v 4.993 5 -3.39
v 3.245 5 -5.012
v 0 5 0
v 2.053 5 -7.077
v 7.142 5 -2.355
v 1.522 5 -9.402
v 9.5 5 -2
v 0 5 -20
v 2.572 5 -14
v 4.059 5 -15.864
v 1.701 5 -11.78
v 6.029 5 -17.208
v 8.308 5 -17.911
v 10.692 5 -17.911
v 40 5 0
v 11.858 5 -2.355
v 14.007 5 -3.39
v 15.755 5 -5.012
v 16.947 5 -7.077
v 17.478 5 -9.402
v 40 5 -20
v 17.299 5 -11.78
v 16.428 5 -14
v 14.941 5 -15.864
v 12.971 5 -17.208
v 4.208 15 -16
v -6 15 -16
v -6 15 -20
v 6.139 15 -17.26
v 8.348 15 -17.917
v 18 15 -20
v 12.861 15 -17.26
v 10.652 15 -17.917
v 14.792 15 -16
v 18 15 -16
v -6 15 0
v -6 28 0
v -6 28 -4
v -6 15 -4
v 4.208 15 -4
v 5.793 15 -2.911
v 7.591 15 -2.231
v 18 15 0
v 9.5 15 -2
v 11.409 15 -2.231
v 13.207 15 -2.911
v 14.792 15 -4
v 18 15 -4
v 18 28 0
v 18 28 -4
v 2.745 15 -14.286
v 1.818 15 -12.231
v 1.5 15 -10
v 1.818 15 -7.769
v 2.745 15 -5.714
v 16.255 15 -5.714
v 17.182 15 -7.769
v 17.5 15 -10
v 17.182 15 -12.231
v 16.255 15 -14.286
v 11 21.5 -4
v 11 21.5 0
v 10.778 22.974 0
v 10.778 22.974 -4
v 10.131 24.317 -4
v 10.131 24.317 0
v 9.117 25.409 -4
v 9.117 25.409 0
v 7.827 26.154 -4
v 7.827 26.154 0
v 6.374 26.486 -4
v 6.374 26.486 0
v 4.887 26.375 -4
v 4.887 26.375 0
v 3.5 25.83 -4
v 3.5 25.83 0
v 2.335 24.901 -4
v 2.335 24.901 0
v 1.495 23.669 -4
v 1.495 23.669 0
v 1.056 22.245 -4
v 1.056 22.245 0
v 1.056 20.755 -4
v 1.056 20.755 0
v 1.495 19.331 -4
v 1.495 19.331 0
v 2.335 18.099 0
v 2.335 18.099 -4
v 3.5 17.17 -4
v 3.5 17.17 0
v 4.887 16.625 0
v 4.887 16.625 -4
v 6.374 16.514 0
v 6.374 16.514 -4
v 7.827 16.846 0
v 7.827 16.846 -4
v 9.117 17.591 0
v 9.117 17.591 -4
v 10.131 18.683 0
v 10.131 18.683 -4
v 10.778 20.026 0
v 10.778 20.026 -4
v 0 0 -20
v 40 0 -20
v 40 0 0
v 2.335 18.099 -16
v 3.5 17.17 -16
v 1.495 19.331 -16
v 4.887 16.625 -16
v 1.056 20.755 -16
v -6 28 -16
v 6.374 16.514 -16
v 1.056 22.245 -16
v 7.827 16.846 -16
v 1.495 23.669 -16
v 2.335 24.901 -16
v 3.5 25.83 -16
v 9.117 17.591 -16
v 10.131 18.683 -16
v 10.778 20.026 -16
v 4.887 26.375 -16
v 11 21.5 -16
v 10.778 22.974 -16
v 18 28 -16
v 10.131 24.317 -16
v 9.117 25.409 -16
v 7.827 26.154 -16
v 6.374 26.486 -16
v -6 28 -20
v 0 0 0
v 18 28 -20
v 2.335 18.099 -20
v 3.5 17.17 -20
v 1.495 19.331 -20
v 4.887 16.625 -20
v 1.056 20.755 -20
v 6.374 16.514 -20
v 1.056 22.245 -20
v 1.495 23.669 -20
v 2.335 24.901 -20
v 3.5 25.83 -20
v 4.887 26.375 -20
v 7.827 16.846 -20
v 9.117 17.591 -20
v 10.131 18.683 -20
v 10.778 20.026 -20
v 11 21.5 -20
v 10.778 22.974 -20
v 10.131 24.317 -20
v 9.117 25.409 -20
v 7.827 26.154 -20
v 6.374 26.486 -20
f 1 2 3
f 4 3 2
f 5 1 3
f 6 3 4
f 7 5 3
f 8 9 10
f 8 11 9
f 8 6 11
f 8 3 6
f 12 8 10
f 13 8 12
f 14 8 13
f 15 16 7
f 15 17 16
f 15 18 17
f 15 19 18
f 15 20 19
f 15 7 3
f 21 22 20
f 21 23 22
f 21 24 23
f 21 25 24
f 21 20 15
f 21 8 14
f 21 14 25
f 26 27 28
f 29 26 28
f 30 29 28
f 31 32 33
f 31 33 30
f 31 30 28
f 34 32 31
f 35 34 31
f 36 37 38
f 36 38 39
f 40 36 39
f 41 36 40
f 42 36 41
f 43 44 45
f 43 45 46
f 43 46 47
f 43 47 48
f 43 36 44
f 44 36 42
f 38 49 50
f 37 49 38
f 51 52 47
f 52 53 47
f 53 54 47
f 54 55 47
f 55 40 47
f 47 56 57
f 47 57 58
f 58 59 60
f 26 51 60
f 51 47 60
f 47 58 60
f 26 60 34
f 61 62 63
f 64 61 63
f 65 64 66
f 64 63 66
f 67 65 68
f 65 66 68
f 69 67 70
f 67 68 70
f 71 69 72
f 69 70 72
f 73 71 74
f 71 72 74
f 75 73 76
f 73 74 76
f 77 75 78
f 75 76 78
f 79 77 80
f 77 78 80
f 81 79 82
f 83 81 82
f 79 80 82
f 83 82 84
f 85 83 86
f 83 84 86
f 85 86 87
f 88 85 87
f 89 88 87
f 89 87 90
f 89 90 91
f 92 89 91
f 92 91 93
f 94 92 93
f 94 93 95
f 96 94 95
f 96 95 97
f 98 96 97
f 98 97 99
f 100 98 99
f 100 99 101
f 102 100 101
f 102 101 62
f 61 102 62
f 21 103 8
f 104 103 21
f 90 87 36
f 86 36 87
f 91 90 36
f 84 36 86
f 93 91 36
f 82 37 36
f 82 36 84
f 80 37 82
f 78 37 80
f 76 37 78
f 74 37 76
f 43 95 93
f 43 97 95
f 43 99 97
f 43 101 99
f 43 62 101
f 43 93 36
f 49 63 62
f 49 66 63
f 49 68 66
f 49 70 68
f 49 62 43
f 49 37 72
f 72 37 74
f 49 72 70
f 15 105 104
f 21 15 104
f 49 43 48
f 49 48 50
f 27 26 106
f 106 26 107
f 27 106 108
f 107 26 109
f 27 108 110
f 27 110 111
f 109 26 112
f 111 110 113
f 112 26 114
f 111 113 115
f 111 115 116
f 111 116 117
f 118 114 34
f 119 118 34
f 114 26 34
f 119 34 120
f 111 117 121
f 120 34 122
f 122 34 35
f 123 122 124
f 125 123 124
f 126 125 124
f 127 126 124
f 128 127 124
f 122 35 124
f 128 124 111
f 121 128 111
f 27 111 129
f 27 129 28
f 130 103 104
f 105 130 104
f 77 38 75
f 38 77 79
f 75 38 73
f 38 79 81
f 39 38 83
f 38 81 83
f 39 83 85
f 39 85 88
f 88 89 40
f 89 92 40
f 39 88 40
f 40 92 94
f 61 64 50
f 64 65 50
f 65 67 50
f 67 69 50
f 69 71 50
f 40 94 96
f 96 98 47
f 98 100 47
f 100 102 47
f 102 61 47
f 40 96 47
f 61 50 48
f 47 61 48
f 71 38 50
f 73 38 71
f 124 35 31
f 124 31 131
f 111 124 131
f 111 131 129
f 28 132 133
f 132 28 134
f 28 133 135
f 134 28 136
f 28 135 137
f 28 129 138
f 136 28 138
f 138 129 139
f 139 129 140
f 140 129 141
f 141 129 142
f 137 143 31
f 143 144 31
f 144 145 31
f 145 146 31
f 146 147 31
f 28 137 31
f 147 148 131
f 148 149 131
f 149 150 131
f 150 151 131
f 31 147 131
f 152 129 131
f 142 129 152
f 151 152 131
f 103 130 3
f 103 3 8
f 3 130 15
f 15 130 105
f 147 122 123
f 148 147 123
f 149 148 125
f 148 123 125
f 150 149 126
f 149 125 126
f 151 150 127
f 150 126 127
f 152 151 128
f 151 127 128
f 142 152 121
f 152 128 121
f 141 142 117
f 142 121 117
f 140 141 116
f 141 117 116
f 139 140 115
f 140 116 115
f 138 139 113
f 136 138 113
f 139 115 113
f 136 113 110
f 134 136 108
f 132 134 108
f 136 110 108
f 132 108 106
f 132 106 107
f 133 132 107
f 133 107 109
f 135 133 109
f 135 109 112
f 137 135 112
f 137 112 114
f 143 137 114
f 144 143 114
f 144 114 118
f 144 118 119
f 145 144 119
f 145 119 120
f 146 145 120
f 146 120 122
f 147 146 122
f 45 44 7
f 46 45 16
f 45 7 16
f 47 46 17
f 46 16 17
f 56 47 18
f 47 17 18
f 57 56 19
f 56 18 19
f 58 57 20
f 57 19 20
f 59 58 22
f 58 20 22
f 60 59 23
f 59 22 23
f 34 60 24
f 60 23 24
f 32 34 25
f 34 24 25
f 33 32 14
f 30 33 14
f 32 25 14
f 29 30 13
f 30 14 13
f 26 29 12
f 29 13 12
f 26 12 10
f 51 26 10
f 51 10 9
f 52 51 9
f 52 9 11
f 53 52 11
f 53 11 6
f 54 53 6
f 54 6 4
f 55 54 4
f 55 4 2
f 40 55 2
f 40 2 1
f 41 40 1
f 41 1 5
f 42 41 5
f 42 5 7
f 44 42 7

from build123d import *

# Parameters (mm, degrees)
SKETCH1_W           = 40
SKETCH1_H           = 20
BOSS_EXTRUDE1_DEPTH = 5
SKETCH2_R           = 8
BOSS_EXTRUDE2_DEPTH = 10
BOSS_EXTRUDE3_DEPTH = 20
CUT_EXTRUDE1_DEPTH  = 42.952353927
SKETCH6_R           = 5
CUT_EXTRUDE2_DEPTH  = 53.763623833


with BuildPart() as part:
    # Sketch1 → Boss-Extrude1 (new body)
    with BuildSketch(Plane(origin=(0, 0, 0), x_dir=(1, 0, 0), z_dir=(0, 1, 0))):
        with Locations((20, 10)):
            Rectangle(SKETCH1_W, SKETCH1_H)
    extrude(amount=BOSS_EXTRUDE1_DEPTH)

    # Sketch2 → Boss-Extrude2 (add)
    with BuildSketch(Plane(origin=(0, 5, 0), x_dir=(1, 0, 0), z_dir=(0, 1, 0))):
        with Locations(Location((9.5, 10, 0), (0, 0, 270))):
            Circle(SKETCH2_R)
    extrude(amount=BOSS_EXTRUDE2_DEPTH)

    # Sketch4 → Boss-Extrude3 (add, through all)
    with BuildSketch(Plane.XY):
        Polygon((-6, 15), (0, 15), (1.5, 15), (17.5, 15), (18, 15), (18, 28), (-6, 28), align=None)
    extrude(amount=-BOSS_EXTRUDE3_DEPTH)

    # Sketch5 → Cut-Extrude1 (cut, through all)
    with BuildSketch(Plane(origin=(18, 0, 0), x_dir=(0, 0, -1), z_dir=(1, 0, 0))):
        Polygon((10, 15), (16, 15), (16, 28), (4, 28), (4, 15), align=None)
    extrude(amount=-CUT_EXTRUDE1_DEPTH, mode=Mode.SUBTRACT)

    # Sketch6 → Cut-Extrude2 (cut, through all)
    with BuildSketch(Plane.XY):
        with Locations((6, 21.5)):
            Circle(SKETCH6_R)
    extrude(amount=-CUT_EXTRUDE2_DEPTH, mode=Mode.SUBTRACT)


solid = part.part
